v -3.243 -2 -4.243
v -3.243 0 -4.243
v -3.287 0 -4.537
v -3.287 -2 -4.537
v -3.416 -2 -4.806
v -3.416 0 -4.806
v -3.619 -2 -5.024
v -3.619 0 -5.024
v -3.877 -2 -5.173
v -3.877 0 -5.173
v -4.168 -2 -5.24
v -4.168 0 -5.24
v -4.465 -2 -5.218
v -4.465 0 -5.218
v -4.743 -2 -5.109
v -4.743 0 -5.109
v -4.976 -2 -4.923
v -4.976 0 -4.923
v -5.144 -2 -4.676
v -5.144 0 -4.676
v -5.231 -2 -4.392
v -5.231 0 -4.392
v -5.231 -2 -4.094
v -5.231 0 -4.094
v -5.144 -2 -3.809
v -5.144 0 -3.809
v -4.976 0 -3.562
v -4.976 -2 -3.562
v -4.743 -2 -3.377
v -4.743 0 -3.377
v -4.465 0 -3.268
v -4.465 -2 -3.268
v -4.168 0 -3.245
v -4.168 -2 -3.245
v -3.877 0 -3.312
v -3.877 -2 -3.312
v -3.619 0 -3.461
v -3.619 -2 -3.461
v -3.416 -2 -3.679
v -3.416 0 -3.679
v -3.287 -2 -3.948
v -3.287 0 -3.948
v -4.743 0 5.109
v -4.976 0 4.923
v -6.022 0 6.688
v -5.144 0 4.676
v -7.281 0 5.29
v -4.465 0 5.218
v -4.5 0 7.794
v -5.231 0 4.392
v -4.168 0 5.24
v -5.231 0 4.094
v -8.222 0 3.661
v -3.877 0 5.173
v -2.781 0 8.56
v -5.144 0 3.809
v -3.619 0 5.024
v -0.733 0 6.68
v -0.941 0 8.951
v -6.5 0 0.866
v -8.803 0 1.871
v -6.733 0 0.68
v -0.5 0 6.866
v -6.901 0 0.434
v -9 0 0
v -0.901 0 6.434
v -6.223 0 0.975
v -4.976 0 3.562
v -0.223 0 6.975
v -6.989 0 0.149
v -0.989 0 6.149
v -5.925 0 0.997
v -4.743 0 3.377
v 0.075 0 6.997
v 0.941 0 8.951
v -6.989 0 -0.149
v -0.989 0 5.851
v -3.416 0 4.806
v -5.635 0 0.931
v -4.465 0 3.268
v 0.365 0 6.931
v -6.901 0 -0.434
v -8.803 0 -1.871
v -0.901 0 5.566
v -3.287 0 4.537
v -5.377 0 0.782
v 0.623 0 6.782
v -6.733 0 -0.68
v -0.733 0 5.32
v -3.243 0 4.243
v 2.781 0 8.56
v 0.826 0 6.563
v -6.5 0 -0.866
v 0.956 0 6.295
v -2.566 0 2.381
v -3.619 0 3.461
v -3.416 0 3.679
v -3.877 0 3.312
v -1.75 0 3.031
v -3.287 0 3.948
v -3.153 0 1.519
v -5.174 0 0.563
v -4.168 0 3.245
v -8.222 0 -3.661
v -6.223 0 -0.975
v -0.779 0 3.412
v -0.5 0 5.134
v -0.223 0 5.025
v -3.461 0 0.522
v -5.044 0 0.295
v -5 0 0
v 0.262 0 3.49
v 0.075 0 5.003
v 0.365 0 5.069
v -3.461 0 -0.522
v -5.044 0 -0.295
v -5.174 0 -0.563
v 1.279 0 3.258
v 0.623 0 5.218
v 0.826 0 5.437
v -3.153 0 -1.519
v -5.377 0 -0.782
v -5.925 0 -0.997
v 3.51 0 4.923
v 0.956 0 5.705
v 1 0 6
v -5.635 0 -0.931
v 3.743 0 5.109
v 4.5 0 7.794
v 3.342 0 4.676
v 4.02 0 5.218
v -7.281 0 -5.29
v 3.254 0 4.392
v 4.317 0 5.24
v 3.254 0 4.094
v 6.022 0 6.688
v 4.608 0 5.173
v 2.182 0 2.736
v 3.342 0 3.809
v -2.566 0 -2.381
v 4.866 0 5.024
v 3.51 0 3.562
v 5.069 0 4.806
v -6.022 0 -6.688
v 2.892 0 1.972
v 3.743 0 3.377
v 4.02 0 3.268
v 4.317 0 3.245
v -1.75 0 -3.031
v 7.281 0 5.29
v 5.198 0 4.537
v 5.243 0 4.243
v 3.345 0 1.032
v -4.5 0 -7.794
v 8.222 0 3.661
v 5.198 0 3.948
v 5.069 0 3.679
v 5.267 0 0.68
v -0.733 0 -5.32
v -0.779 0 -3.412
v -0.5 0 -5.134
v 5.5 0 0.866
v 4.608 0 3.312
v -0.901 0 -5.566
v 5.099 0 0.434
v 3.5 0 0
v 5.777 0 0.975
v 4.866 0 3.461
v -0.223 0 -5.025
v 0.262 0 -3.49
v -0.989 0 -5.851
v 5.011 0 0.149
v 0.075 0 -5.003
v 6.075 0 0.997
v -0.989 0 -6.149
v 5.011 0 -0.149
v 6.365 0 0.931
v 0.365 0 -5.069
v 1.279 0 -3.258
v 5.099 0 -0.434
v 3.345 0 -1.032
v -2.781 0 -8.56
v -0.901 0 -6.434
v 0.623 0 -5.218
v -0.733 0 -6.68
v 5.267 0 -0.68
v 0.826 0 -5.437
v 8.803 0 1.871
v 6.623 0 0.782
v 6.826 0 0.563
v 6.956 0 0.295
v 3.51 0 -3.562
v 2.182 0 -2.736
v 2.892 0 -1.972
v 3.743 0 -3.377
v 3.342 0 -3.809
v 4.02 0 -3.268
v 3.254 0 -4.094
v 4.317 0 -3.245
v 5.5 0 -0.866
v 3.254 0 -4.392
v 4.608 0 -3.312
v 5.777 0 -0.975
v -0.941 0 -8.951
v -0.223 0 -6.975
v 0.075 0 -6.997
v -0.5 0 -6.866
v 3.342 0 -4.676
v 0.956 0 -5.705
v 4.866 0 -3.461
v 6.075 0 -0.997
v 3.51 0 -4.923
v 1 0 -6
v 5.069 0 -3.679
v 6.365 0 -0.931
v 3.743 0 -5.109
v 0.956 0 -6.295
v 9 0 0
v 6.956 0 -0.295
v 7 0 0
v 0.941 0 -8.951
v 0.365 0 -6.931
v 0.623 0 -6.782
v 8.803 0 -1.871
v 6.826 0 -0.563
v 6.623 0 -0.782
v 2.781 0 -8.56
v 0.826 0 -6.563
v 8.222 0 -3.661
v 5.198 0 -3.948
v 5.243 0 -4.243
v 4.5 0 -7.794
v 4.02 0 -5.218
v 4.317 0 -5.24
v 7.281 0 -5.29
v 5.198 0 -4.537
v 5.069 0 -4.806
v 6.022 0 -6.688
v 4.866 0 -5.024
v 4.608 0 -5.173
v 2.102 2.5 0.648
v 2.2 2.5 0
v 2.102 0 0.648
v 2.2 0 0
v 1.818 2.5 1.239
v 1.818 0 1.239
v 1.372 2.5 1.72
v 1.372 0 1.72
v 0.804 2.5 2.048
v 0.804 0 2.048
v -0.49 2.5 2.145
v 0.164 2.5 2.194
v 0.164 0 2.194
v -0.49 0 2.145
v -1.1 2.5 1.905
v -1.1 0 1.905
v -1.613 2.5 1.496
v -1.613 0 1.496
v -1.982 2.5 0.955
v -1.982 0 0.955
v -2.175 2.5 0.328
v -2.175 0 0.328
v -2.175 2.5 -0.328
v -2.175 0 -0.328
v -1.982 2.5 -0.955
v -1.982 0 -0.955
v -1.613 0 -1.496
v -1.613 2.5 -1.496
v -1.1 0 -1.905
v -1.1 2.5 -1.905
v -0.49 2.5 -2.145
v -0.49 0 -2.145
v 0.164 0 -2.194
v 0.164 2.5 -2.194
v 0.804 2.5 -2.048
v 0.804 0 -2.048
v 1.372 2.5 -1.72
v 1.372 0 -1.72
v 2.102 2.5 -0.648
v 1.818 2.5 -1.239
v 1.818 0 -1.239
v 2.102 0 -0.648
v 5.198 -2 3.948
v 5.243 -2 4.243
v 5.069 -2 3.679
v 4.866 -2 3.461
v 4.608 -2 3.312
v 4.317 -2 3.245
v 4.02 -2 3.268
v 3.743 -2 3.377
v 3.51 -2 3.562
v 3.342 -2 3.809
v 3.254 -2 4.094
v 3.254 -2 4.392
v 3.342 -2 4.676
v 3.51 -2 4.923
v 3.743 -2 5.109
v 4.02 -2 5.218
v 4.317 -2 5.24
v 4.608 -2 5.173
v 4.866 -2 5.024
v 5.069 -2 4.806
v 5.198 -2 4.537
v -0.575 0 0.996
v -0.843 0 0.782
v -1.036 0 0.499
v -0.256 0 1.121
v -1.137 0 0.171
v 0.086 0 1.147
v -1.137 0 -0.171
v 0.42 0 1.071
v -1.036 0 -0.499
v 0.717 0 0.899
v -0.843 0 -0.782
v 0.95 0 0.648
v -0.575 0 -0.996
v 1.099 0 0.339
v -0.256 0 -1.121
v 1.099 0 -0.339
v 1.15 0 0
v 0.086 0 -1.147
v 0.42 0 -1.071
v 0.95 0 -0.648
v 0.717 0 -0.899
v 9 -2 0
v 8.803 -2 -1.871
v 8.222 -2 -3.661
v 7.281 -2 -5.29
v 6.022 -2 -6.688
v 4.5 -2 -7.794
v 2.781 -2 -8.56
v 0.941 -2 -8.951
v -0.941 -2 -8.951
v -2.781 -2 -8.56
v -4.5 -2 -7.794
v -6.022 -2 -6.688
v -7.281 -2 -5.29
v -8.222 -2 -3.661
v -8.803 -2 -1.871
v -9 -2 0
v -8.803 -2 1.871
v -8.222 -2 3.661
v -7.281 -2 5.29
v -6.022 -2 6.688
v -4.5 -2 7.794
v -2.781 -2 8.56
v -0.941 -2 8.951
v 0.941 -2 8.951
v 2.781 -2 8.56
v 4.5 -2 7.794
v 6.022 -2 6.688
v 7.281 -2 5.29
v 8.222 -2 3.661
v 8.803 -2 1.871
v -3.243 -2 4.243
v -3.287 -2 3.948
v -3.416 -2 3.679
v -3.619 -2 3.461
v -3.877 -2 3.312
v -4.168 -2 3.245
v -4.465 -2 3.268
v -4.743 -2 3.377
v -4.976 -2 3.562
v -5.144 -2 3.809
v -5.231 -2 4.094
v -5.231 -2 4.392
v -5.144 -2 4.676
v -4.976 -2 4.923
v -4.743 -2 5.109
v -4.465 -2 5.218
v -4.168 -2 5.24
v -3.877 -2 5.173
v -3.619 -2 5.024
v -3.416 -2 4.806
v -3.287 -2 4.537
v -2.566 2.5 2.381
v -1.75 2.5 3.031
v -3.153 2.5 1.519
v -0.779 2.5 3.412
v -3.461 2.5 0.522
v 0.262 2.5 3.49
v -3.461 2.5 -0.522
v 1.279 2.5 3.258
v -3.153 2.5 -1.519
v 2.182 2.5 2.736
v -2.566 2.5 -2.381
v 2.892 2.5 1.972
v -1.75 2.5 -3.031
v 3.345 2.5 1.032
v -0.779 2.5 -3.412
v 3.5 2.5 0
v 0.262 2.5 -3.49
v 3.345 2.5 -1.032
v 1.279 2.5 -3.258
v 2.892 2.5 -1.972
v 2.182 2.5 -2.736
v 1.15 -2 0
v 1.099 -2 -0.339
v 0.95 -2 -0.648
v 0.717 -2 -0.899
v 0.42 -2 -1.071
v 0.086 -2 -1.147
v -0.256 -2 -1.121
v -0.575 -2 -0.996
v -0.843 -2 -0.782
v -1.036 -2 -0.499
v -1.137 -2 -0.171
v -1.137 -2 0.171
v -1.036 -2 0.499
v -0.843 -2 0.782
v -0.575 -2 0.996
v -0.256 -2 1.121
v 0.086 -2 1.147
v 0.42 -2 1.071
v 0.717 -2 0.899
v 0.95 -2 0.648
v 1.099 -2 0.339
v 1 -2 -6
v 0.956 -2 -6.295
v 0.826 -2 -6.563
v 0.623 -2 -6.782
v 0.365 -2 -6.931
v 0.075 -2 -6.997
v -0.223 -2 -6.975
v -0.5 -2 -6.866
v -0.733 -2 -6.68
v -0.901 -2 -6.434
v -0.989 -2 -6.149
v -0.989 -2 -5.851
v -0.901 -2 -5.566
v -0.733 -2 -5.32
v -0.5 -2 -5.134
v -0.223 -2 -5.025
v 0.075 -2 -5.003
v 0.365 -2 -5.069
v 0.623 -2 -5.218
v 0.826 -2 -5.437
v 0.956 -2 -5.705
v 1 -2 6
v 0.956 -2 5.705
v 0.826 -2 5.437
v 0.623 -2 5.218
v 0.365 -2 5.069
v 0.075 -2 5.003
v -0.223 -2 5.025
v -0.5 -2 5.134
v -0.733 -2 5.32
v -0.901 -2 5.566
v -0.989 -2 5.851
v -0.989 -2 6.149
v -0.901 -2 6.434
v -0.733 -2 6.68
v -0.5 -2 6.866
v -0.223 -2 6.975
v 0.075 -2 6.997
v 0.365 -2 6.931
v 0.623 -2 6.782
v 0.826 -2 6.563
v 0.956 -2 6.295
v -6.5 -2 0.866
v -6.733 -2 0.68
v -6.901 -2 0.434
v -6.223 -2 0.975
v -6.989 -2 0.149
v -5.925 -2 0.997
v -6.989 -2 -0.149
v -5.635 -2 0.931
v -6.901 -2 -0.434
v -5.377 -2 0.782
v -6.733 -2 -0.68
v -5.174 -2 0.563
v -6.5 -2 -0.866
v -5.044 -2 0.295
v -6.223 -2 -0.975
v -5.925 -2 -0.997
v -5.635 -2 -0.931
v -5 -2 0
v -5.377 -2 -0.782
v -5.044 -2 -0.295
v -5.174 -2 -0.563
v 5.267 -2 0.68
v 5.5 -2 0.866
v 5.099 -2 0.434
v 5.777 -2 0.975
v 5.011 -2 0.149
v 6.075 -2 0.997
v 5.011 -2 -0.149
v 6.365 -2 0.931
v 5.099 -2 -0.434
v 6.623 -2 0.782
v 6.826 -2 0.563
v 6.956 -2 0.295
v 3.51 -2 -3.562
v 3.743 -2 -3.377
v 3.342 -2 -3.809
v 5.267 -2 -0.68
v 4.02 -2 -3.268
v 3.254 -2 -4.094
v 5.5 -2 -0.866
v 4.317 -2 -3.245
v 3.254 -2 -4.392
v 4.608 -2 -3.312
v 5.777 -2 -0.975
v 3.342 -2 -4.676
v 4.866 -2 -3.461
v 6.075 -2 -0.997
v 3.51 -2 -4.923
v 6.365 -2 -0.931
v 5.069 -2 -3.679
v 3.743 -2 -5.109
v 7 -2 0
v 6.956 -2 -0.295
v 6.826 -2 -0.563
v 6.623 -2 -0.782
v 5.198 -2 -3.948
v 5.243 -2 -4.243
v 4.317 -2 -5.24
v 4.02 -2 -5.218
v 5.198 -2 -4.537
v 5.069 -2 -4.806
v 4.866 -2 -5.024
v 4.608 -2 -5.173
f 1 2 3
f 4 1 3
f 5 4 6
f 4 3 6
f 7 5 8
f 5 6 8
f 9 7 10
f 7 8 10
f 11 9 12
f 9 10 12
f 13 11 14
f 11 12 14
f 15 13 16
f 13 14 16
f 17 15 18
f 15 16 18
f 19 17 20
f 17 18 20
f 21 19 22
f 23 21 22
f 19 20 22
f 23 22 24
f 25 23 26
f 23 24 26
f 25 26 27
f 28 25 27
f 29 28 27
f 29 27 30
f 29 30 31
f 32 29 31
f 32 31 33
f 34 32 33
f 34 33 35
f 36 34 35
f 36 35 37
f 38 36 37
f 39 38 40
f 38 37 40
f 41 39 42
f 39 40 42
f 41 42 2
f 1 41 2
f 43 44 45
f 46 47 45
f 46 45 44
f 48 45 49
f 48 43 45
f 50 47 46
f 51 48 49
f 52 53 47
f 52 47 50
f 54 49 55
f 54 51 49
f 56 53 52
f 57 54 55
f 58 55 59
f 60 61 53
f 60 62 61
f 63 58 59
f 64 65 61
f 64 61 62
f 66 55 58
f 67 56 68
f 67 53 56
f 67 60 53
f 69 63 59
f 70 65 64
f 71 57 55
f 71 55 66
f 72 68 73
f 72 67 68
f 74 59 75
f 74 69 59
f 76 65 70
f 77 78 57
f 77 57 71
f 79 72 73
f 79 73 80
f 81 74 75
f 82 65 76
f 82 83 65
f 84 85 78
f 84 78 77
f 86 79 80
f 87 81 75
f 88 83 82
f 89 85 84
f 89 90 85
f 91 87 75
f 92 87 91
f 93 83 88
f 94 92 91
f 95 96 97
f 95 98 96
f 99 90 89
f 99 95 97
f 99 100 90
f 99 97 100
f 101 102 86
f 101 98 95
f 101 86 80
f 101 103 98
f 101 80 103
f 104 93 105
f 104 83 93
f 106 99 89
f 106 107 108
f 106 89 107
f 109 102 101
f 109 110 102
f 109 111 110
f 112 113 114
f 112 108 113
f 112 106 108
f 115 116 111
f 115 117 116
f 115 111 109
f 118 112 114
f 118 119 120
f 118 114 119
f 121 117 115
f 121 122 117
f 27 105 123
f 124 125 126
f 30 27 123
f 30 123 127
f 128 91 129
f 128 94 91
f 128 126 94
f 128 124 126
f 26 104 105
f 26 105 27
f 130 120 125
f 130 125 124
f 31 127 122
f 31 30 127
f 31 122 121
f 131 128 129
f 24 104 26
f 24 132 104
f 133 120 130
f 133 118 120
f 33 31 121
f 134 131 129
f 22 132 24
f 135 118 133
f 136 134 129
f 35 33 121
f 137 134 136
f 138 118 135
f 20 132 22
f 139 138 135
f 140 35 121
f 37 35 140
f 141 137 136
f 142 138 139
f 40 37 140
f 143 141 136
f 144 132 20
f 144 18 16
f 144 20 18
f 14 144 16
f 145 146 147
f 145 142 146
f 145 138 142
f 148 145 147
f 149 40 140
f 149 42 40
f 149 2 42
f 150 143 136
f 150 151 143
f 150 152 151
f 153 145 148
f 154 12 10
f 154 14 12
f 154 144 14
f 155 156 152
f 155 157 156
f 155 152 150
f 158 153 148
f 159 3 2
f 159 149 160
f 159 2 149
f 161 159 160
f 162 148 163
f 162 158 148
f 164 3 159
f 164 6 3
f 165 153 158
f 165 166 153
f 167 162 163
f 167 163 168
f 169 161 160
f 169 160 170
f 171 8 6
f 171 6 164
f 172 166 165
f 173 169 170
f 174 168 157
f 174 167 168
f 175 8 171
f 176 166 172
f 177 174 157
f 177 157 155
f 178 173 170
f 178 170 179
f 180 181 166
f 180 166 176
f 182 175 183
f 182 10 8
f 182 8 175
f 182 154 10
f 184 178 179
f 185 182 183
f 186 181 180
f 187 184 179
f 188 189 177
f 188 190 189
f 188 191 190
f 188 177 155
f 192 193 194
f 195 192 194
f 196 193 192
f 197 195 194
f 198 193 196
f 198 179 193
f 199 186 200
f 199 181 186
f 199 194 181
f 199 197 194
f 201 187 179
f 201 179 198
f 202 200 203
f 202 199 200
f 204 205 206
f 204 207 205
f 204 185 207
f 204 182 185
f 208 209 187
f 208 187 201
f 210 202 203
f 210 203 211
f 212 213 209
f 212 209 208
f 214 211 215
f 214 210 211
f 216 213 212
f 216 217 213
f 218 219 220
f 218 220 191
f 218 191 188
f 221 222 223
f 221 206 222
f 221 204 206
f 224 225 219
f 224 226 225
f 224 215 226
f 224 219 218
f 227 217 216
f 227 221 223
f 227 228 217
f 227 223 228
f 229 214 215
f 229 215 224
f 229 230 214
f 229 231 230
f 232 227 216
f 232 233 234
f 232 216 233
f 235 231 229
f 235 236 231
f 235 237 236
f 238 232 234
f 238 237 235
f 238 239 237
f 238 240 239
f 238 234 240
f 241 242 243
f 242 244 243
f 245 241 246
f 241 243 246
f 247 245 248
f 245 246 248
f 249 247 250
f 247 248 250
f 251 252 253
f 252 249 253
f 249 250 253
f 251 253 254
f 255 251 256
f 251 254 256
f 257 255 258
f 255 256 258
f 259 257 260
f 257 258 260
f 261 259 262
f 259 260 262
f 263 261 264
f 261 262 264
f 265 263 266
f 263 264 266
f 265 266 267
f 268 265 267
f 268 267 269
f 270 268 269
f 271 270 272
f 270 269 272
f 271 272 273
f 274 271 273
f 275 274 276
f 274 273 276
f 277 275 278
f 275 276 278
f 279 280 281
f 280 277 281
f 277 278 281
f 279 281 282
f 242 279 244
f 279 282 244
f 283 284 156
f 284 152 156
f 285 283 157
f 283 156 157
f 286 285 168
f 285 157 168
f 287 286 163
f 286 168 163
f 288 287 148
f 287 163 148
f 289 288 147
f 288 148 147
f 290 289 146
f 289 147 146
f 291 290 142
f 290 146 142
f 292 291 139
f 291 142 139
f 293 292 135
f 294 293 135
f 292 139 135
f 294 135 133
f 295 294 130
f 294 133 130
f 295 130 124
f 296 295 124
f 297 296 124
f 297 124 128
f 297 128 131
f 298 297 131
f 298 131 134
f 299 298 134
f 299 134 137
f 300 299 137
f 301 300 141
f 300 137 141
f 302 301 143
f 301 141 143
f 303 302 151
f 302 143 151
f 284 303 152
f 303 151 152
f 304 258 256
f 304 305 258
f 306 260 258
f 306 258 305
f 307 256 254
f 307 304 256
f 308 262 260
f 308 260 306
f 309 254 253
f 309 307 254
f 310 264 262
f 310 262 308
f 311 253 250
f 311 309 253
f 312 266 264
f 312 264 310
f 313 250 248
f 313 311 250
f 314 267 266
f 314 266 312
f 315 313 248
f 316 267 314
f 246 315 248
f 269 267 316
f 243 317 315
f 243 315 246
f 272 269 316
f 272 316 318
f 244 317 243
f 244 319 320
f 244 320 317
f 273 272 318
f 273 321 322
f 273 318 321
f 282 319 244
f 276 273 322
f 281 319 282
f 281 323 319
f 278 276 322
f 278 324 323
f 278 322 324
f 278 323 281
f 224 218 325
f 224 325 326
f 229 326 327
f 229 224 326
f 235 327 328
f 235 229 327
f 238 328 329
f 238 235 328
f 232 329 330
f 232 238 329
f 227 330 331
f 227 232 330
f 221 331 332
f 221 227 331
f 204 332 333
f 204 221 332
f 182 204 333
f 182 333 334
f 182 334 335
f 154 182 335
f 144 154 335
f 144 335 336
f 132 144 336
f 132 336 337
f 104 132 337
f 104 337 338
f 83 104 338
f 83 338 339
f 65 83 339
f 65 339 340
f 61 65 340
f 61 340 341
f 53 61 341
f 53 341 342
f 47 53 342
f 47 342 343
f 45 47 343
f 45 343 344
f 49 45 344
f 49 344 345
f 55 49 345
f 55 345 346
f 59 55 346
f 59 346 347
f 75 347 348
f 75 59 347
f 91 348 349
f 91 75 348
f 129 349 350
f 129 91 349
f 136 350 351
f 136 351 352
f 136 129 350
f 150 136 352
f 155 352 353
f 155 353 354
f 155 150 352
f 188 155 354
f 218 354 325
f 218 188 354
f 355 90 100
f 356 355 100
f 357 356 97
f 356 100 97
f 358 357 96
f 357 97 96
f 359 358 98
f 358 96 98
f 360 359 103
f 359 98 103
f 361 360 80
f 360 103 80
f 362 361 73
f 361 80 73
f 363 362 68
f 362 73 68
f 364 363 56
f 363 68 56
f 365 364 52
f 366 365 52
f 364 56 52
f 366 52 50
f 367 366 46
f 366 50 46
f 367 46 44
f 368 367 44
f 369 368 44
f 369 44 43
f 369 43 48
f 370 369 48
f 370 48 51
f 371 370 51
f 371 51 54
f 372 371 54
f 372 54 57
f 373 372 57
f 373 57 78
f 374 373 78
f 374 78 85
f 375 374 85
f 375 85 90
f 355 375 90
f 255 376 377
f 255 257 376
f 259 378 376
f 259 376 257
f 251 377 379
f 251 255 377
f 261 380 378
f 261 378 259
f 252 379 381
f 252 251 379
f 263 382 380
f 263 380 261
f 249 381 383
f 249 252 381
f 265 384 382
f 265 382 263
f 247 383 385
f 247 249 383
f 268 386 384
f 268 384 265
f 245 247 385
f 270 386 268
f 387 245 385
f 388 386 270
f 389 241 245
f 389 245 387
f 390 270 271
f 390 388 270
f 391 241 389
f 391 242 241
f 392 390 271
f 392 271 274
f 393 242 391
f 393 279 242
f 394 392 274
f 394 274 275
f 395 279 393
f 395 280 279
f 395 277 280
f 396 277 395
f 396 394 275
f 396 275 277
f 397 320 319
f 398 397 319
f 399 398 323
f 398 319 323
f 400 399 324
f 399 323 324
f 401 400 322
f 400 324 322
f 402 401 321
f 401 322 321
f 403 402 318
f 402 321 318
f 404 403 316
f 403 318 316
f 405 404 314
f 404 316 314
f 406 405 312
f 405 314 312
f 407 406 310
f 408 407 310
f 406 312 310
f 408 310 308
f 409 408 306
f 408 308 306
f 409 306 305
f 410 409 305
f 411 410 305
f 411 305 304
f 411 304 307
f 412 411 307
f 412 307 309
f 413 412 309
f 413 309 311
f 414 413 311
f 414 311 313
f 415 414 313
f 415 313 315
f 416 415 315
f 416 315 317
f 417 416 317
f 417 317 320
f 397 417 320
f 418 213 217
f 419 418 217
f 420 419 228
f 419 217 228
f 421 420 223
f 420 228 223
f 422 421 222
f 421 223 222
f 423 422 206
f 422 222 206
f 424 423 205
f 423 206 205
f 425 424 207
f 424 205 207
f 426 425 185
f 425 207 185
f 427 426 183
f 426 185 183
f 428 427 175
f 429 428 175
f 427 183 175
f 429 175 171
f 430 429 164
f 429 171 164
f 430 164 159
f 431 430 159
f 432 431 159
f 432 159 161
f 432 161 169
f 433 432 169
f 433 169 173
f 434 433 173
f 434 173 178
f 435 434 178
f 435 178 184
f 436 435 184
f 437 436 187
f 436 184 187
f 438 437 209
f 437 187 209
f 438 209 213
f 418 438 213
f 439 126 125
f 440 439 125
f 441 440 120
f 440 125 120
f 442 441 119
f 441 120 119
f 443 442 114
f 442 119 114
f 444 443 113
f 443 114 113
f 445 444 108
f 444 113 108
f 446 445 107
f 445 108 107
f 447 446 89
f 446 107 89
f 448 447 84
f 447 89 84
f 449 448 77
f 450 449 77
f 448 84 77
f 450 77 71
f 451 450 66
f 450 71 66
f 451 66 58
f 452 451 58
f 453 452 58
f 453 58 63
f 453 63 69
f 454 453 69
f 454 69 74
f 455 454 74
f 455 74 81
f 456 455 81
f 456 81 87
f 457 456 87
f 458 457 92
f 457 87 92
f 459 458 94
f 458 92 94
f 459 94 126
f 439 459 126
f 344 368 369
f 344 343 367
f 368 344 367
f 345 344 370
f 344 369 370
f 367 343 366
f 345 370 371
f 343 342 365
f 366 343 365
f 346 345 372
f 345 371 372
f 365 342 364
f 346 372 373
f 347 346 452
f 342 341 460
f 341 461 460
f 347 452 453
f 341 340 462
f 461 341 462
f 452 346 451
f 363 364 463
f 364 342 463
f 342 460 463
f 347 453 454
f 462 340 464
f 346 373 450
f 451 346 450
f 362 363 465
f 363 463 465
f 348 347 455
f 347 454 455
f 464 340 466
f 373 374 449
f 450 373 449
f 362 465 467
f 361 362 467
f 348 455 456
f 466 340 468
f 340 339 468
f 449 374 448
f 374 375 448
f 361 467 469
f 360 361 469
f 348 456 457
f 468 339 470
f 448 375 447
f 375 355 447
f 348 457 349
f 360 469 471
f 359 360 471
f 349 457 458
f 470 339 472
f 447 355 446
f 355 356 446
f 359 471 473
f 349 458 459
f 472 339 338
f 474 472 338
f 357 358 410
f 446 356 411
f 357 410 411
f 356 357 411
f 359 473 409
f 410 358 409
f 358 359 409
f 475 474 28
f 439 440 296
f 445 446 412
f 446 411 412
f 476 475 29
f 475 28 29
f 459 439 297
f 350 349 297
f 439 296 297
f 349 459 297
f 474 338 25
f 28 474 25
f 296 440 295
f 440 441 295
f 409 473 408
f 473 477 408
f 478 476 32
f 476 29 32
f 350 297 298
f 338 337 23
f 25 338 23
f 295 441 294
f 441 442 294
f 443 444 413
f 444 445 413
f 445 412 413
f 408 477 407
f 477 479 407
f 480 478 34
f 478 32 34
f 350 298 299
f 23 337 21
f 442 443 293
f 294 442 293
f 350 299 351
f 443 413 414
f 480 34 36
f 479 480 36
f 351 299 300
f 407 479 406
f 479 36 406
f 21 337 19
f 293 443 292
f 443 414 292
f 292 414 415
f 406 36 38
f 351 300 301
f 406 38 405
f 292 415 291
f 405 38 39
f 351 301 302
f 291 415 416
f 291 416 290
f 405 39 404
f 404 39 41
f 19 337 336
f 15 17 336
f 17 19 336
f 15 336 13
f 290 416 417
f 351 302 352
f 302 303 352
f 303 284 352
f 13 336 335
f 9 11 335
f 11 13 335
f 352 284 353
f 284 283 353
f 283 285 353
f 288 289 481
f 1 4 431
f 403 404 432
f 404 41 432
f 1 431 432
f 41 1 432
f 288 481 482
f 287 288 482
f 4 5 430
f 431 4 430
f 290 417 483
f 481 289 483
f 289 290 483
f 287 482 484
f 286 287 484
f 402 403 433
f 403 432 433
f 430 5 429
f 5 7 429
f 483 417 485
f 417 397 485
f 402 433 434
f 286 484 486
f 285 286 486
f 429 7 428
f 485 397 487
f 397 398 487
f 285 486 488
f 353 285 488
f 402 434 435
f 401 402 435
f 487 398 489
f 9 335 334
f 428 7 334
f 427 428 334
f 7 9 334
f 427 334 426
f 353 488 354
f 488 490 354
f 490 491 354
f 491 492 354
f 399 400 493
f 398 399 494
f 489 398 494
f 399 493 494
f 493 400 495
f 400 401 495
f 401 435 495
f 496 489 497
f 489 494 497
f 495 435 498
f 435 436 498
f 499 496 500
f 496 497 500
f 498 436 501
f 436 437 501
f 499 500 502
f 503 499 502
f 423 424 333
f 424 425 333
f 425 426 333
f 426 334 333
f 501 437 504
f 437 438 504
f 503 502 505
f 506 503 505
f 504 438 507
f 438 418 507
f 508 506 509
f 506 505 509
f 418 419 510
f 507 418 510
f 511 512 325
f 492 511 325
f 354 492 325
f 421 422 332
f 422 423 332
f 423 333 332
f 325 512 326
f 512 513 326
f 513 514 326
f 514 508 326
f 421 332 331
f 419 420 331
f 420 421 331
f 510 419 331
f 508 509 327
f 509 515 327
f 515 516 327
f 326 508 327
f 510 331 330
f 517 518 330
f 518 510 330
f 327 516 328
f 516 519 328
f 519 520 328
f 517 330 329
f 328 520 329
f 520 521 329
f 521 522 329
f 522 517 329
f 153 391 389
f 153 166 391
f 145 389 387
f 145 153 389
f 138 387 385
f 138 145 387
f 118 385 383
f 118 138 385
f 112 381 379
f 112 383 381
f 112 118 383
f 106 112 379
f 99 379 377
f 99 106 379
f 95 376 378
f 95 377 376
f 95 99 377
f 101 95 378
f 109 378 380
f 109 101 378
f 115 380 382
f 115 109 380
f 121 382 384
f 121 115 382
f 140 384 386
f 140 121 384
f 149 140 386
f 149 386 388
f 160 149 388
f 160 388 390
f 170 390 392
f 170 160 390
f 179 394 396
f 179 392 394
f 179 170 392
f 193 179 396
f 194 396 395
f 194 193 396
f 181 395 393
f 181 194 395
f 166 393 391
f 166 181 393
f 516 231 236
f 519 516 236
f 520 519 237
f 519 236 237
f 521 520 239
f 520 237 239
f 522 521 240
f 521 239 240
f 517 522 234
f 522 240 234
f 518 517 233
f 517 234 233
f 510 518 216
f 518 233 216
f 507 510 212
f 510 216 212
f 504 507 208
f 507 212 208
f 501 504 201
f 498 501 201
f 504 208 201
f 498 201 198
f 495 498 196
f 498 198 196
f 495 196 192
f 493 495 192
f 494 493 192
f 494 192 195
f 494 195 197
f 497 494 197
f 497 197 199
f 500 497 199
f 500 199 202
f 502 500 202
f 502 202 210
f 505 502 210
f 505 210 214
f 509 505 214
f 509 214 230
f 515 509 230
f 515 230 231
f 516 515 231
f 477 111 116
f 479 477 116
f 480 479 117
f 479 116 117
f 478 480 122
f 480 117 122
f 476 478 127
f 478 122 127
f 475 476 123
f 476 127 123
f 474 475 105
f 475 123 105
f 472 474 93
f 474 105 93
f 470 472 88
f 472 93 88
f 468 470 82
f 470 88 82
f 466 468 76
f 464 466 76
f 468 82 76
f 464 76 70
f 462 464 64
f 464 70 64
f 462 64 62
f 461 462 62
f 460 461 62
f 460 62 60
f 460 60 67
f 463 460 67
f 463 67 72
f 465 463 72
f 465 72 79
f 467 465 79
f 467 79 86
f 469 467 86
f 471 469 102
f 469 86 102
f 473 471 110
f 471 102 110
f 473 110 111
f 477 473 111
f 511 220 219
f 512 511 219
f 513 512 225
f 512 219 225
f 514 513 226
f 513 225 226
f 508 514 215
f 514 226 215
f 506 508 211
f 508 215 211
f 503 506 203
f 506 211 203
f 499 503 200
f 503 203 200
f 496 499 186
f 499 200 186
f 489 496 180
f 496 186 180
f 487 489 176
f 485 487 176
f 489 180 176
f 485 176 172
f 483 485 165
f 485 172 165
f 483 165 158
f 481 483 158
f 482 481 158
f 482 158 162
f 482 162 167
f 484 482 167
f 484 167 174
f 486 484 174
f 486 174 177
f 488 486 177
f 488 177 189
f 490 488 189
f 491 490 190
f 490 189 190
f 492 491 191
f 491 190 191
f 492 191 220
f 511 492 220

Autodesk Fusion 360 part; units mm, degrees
sketch "스케치1" plane through (0, 0, 0) normal (0, 1, 0) x (1, 0, 0)
  circle A0 centre (0, 0) radius 9
  circle A1 centre (0, 0) radius 2.5
  circle A2 centre (0, 0) radius 6 construction
  circle A3 centre (6, 0) radius 1
  circle A4 centre (4.2426, 4.2426) radius 1
  circle A5 centre (0, 6) radius 1
  circle A6 centre (-4.2426, 4.2426) radius 1
  circle A7 centre (-6, 0) radius 1
  circle A8 centre (-4.2426, -4.2426) radius 1
  circle A9 centre (0, -6) radius 1
  circle A10 centre (4.2426, -4.2426) radius 1
  circle A11 centre (0, 0) radius 1.15
  circle A12 centre (0, 0) radius 2.2
  circle A13 centre (0, 0) radius 3.5
  dimension "d1" = 18
  dimension "d2" = 5
  dimension "d3" = 12
  dimension "d4" = 2
  dimension "d6" = 360
  dimension "d7" = 2.3
  dimension "d10" = 4.4
  dimension "d11" = 7
extrude "돌출1" add sketch "스케치1" against normal blind 2 contours A0 | A1 | A12 | A13
extrude "돌출2" add sketch "스케치1" along normal blind 2.5 contours A1 | A13
